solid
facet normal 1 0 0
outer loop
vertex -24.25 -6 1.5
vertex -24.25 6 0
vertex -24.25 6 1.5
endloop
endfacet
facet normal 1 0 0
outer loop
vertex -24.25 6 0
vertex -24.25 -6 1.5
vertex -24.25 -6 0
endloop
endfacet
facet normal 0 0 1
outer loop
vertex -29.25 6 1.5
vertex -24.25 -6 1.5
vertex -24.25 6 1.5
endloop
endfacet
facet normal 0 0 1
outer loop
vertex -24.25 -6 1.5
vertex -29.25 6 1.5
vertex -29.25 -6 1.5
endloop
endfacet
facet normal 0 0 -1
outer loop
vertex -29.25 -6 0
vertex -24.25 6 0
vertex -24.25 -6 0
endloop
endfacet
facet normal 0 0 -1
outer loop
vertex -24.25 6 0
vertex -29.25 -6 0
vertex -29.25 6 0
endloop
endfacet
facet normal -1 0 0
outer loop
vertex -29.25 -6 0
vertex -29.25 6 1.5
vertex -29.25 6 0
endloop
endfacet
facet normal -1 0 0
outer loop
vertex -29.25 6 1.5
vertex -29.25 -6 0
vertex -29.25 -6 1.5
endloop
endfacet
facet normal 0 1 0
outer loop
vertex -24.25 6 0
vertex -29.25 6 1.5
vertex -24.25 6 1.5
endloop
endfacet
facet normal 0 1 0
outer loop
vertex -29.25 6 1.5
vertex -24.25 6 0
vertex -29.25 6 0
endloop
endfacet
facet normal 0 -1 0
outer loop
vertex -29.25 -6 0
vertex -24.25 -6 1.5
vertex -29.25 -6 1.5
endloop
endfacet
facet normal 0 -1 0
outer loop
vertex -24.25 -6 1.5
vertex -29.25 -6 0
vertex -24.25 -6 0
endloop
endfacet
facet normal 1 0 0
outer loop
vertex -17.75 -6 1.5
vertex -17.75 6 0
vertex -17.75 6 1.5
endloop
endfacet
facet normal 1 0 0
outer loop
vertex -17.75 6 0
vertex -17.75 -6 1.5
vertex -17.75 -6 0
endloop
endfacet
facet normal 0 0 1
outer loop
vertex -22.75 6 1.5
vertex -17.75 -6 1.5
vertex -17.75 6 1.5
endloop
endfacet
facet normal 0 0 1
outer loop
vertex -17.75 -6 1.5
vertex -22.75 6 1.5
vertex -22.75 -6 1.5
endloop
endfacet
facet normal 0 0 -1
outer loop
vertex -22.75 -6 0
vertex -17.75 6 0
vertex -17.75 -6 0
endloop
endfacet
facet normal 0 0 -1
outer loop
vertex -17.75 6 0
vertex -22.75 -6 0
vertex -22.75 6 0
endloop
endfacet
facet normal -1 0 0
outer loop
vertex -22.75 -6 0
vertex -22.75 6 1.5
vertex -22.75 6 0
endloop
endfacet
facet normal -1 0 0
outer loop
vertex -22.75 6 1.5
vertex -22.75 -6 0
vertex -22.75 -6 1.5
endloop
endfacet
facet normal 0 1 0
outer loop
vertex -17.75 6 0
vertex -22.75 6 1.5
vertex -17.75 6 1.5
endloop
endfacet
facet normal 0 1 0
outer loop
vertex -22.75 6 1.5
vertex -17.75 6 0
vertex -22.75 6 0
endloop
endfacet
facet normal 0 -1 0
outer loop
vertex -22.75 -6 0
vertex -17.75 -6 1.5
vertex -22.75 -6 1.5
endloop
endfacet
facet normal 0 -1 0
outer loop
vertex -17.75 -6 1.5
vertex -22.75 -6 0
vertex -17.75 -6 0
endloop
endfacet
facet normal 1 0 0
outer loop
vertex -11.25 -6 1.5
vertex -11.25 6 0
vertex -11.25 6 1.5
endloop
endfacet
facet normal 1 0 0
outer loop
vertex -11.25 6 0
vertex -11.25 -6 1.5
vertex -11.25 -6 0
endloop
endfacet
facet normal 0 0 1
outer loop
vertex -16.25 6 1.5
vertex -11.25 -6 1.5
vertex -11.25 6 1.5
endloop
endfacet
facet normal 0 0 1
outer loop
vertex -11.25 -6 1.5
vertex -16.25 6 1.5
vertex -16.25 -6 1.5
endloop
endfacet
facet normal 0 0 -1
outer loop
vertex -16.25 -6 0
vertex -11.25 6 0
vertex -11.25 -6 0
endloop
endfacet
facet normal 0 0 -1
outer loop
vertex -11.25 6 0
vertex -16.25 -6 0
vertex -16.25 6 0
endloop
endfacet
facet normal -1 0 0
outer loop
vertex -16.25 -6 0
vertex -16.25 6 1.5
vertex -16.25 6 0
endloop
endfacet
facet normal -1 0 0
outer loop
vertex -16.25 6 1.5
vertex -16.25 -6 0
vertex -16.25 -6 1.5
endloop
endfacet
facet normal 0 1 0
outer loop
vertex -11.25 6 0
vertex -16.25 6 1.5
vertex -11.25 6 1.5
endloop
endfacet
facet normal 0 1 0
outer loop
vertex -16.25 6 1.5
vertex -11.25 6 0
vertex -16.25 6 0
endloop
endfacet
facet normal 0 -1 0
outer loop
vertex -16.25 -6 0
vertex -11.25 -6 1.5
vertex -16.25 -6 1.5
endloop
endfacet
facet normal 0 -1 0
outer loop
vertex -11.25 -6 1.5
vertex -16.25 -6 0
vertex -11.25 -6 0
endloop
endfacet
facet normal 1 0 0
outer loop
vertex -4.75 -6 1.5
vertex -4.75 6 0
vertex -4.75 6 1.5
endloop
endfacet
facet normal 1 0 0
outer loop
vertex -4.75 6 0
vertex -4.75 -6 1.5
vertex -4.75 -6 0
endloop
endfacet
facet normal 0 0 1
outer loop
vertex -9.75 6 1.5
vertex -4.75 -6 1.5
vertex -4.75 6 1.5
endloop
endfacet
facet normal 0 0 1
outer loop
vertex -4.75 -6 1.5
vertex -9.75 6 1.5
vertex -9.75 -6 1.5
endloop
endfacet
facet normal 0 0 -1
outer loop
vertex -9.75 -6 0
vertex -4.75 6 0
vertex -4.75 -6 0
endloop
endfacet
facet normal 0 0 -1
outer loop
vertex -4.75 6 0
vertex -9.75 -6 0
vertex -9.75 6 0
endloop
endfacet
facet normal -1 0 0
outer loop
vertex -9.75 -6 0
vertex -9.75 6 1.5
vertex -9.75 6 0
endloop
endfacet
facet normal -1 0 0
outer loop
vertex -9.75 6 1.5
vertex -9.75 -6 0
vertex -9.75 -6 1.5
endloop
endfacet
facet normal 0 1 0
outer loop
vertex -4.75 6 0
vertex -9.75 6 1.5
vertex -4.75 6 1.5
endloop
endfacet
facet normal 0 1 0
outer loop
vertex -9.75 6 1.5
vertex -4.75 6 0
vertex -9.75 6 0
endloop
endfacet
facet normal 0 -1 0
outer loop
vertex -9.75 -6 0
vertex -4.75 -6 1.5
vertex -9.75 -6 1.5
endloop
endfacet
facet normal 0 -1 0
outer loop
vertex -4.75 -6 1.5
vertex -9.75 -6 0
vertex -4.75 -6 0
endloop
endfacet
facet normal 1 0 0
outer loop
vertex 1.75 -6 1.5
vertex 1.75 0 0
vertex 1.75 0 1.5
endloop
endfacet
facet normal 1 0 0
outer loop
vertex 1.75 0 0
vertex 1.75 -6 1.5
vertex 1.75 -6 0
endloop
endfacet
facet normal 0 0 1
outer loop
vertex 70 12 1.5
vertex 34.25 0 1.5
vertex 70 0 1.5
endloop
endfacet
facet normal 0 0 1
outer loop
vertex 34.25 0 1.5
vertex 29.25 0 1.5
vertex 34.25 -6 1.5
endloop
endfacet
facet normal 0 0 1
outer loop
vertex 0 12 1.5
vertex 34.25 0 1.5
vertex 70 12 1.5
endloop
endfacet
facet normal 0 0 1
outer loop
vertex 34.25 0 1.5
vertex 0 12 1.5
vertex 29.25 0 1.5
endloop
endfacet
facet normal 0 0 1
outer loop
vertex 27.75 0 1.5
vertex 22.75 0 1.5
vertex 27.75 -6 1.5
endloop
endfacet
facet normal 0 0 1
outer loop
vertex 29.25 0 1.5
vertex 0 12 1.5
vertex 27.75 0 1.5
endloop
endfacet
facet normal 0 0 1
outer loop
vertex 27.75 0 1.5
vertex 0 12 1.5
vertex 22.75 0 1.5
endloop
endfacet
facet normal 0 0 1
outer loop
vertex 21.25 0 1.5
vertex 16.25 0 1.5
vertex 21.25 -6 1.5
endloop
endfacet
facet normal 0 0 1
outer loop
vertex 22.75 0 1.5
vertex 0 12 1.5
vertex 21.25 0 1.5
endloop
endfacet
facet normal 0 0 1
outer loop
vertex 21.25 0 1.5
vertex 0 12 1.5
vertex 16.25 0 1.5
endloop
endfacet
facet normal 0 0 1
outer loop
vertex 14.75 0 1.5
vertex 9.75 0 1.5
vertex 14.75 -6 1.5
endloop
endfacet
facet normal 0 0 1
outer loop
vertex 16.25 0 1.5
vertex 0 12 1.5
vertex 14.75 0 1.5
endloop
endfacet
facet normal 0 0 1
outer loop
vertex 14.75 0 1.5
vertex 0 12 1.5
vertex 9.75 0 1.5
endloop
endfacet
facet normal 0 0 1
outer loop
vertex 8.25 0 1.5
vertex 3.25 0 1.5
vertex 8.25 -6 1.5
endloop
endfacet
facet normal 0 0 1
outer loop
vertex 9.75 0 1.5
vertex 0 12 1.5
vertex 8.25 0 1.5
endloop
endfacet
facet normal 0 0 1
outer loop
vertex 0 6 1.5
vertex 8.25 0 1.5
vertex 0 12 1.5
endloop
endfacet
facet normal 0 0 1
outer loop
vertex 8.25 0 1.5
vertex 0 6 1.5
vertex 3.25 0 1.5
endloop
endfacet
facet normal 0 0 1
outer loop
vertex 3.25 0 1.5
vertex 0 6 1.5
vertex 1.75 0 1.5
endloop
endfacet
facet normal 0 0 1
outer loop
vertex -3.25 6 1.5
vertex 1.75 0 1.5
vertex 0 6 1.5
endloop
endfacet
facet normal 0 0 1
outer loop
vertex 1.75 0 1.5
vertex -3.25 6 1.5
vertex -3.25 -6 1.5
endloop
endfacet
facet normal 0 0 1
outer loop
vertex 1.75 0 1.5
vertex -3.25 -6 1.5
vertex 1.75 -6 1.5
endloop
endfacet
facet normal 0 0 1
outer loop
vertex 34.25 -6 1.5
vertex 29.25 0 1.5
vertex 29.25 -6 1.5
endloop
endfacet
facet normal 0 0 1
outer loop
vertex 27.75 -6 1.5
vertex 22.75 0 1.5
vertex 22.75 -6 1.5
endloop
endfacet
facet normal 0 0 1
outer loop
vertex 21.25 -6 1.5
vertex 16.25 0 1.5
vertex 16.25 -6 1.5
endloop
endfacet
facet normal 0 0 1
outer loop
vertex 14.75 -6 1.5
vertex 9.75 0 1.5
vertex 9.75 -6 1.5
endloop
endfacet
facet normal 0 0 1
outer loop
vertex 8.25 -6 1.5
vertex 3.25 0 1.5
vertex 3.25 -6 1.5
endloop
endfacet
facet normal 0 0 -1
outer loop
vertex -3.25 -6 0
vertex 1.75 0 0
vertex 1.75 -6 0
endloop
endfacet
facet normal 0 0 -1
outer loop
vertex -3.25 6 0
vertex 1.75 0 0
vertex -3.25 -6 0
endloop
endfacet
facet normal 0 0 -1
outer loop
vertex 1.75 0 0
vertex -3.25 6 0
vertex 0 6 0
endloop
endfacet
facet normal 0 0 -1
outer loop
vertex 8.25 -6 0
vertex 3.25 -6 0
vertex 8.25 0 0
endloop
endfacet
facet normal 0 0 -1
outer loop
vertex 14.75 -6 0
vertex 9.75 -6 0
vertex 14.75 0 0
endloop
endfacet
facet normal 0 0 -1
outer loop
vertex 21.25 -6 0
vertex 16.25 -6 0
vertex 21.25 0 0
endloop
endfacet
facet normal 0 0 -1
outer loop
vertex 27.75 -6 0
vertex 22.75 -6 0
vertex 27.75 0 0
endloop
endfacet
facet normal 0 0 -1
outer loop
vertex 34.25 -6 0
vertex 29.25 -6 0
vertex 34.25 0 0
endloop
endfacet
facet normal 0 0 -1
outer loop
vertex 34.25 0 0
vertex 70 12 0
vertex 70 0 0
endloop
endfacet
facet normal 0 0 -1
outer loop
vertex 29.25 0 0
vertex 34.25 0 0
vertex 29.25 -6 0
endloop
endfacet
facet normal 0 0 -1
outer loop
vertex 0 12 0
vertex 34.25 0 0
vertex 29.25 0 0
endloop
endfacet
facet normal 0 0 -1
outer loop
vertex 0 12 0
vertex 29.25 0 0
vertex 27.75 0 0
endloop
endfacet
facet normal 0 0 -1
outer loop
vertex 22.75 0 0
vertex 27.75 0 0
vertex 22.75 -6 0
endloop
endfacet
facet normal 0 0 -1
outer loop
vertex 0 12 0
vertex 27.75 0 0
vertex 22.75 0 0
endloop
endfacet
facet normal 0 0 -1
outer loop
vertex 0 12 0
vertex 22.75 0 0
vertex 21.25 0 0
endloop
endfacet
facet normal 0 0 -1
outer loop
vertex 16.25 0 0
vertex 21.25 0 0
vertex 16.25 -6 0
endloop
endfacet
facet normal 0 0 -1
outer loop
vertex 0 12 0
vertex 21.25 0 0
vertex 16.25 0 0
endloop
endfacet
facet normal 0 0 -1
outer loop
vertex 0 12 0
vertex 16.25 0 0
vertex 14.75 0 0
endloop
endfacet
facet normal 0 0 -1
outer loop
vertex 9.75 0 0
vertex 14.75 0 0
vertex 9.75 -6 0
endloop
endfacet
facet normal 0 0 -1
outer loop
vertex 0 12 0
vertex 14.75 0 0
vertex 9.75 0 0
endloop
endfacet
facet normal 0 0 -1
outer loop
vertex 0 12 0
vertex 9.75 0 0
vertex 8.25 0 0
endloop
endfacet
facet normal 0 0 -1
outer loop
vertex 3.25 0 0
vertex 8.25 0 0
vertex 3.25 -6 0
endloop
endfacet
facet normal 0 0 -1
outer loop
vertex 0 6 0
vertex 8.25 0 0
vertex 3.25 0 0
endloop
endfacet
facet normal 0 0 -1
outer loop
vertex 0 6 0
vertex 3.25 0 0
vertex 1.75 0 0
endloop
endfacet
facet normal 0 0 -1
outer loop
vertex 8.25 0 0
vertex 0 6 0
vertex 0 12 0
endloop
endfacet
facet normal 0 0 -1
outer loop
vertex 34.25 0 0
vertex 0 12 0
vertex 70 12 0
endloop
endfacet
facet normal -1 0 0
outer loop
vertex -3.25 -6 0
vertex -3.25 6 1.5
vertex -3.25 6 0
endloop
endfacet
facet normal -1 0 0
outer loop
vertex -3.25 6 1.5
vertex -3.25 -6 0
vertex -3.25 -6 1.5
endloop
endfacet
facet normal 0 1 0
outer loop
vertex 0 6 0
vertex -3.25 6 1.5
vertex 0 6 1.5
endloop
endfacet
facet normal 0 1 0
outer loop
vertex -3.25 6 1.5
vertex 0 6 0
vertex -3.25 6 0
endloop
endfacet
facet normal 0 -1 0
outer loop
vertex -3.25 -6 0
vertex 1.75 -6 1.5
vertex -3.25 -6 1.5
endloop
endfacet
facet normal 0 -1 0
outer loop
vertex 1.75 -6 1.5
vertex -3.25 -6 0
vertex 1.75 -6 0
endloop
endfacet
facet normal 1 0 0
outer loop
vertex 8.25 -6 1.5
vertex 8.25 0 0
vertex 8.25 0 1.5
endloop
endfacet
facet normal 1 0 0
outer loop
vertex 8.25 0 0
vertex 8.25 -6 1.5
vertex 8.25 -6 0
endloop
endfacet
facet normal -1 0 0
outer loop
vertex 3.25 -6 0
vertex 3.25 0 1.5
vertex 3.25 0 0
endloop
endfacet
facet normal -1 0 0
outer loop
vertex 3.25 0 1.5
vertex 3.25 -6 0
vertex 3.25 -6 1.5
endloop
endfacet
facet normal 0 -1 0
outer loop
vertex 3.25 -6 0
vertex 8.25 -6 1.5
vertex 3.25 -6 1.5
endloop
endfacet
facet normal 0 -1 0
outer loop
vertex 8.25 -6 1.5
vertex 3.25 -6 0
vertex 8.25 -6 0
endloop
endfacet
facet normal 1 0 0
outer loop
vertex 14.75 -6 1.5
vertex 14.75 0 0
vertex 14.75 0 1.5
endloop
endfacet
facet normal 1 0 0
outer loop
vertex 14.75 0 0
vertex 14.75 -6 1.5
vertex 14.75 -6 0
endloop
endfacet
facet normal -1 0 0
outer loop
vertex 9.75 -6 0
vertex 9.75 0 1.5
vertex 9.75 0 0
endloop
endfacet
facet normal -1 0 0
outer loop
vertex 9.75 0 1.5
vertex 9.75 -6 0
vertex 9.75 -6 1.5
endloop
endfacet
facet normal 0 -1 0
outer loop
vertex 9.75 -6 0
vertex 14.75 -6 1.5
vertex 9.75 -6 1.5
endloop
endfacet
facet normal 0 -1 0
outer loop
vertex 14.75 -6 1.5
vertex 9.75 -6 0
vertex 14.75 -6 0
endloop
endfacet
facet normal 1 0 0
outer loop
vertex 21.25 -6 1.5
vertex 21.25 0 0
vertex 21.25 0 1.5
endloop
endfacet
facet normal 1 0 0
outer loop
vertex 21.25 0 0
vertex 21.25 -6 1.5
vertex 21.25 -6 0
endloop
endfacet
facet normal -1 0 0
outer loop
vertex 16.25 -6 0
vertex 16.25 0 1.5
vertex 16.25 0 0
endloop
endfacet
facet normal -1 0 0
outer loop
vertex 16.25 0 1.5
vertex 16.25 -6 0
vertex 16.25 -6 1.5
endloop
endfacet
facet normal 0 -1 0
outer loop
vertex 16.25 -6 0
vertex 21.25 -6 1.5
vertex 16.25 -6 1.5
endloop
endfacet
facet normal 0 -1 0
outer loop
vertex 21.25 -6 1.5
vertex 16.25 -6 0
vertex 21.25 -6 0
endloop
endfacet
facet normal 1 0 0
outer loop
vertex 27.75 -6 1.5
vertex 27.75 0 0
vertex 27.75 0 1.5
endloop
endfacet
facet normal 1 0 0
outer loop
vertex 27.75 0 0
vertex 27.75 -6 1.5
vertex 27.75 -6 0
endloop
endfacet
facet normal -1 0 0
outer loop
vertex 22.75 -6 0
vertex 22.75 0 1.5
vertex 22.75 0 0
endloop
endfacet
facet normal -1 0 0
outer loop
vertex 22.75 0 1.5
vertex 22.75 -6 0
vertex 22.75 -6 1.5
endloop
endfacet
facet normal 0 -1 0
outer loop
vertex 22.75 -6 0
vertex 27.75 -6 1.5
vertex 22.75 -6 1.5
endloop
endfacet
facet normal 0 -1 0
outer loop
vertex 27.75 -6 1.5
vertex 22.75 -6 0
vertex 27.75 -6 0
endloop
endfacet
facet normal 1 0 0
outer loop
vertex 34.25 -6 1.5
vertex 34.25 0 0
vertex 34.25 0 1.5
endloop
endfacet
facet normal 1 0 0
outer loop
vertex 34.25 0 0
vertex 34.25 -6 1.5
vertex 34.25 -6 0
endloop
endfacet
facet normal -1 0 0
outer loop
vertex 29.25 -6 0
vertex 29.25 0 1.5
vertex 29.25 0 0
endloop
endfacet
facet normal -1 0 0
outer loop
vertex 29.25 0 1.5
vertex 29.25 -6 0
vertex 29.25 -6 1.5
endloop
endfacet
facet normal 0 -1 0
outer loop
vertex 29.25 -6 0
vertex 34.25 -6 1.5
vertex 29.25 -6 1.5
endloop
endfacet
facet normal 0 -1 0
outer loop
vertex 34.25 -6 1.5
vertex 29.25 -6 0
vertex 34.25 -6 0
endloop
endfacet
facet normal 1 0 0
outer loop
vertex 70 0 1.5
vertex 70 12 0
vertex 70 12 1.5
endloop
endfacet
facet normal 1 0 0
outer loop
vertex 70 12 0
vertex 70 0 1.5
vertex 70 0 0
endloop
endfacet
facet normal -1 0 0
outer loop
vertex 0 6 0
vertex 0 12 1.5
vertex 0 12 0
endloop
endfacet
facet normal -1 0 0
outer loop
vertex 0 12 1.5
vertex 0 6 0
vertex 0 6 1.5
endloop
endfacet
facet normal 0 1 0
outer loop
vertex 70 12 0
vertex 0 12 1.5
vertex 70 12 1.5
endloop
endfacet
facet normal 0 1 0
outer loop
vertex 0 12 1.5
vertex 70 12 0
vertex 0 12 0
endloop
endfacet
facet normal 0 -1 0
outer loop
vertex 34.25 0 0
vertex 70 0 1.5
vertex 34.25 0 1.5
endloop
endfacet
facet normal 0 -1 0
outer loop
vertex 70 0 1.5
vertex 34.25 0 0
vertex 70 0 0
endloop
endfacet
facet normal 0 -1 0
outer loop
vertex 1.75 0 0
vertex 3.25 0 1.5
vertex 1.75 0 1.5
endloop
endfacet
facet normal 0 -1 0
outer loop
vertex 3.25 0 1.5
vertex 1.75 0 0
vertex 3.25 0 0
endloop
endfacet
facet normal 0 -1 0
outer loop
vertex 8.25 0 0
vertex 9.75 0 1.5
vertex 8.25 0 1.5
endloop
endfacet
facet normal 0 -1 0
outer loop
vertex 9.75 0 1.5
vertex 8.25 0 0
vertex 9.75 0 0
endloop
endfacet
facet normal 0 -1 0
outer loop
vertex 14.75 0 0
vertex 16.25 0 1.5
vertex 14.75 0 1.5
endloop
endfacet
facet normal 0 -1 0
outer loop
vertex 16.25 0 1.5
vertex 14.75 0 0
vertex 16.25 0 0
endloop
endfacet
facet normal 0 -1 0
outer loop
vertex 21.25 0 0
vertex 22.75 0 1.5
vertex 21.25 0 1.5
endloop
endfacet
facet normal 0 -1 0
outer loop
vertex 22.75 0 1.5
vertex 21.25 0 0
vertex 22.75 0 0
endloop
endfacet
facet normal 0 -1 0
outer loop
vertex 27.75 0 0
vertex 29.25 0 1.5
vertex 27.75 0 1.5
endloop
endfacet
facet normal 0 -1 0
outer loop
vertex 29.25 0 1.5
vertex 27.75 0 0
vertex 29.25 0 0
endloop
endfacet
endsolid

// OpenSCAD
// --- Dimensions ---
// Thickness of the plate (Z-axis)
plate_thickness = 1.5;

// Spine dimensions (X, Y)
spine_length = 70;
spine_width = 12;

// Tooth dimensions (X, Y)
tooth_width = 5.0;
tooth_length = 12;

// Gap between teeth
gap_width = 1.5;

// Number of teeth
num_teeth = 10;

// --- Calculated Values ---
// Total width of the tooth row (teeth + gaps)
// There are 10 teeth and 9 gaps between them.
tooth_row_width = (num_teeth * tooth_width) + ((num_teeth - 1) * gap_width);

// Start X position for the first tooth's left edge
// The total width of the tooth row is tooth_row_width.
// Centered at X=0, the first tooth starts at:
start_x = -(tooth_row_width / 2);

// Step between teeth (width + gap)
step_x = tooth_width + gap_width;

// Set global resolution
$fn = 64;

// --- Main Model ---
union() {
    // 1. The Spine
    // Centered at origin, lying on XY plane.
    // X: -spine_length/2 to +spine_length/2
    // Y: -spine_width/2 to +spine_width/2
    // Z: 0 to plate_thickness
    translate([0, 0, 0]) {
        cube([spine_length, spine_width, plate_thickness], center = false);
    }

    // 2. The Teeth
    // Each tooth hangs from the bottom edge of the spine (Y = -spine_width/2).
    // They extend in the -Y direction.
    for (i = [0 : num_teeth - 1]) {
        // Calculate X position for the current tooth
        // Center of the tooth
        tooth_center_x = start_x + (i * step_x) + (tooth_width / 2);
        
        // Y position: 
        // Top of tooth is at Y = -spine_width/2
        // Bottom of tooth is at Y = -spine_width/2 - tooth_length
        tooth_y_start = -spine_width / 2;
        tooth_y_end = -spine_width / 2 - tooth_length;
        
        // Translate to the center of the tooth in X, and the top edge in Y
        // We want the tooth to be printed as part of the solid.
        // The tooth is a block of size [tooth_width, tooth_length, plate_thickness]
        // positioned such that its top edge aligns with the spine's bottom edge.
        
        translate([tooth_center_x, tooth_y_start, 0]) {
            cube([tooth_width, tooth_length, plate_thickness], center = false);
        }
    }
}
